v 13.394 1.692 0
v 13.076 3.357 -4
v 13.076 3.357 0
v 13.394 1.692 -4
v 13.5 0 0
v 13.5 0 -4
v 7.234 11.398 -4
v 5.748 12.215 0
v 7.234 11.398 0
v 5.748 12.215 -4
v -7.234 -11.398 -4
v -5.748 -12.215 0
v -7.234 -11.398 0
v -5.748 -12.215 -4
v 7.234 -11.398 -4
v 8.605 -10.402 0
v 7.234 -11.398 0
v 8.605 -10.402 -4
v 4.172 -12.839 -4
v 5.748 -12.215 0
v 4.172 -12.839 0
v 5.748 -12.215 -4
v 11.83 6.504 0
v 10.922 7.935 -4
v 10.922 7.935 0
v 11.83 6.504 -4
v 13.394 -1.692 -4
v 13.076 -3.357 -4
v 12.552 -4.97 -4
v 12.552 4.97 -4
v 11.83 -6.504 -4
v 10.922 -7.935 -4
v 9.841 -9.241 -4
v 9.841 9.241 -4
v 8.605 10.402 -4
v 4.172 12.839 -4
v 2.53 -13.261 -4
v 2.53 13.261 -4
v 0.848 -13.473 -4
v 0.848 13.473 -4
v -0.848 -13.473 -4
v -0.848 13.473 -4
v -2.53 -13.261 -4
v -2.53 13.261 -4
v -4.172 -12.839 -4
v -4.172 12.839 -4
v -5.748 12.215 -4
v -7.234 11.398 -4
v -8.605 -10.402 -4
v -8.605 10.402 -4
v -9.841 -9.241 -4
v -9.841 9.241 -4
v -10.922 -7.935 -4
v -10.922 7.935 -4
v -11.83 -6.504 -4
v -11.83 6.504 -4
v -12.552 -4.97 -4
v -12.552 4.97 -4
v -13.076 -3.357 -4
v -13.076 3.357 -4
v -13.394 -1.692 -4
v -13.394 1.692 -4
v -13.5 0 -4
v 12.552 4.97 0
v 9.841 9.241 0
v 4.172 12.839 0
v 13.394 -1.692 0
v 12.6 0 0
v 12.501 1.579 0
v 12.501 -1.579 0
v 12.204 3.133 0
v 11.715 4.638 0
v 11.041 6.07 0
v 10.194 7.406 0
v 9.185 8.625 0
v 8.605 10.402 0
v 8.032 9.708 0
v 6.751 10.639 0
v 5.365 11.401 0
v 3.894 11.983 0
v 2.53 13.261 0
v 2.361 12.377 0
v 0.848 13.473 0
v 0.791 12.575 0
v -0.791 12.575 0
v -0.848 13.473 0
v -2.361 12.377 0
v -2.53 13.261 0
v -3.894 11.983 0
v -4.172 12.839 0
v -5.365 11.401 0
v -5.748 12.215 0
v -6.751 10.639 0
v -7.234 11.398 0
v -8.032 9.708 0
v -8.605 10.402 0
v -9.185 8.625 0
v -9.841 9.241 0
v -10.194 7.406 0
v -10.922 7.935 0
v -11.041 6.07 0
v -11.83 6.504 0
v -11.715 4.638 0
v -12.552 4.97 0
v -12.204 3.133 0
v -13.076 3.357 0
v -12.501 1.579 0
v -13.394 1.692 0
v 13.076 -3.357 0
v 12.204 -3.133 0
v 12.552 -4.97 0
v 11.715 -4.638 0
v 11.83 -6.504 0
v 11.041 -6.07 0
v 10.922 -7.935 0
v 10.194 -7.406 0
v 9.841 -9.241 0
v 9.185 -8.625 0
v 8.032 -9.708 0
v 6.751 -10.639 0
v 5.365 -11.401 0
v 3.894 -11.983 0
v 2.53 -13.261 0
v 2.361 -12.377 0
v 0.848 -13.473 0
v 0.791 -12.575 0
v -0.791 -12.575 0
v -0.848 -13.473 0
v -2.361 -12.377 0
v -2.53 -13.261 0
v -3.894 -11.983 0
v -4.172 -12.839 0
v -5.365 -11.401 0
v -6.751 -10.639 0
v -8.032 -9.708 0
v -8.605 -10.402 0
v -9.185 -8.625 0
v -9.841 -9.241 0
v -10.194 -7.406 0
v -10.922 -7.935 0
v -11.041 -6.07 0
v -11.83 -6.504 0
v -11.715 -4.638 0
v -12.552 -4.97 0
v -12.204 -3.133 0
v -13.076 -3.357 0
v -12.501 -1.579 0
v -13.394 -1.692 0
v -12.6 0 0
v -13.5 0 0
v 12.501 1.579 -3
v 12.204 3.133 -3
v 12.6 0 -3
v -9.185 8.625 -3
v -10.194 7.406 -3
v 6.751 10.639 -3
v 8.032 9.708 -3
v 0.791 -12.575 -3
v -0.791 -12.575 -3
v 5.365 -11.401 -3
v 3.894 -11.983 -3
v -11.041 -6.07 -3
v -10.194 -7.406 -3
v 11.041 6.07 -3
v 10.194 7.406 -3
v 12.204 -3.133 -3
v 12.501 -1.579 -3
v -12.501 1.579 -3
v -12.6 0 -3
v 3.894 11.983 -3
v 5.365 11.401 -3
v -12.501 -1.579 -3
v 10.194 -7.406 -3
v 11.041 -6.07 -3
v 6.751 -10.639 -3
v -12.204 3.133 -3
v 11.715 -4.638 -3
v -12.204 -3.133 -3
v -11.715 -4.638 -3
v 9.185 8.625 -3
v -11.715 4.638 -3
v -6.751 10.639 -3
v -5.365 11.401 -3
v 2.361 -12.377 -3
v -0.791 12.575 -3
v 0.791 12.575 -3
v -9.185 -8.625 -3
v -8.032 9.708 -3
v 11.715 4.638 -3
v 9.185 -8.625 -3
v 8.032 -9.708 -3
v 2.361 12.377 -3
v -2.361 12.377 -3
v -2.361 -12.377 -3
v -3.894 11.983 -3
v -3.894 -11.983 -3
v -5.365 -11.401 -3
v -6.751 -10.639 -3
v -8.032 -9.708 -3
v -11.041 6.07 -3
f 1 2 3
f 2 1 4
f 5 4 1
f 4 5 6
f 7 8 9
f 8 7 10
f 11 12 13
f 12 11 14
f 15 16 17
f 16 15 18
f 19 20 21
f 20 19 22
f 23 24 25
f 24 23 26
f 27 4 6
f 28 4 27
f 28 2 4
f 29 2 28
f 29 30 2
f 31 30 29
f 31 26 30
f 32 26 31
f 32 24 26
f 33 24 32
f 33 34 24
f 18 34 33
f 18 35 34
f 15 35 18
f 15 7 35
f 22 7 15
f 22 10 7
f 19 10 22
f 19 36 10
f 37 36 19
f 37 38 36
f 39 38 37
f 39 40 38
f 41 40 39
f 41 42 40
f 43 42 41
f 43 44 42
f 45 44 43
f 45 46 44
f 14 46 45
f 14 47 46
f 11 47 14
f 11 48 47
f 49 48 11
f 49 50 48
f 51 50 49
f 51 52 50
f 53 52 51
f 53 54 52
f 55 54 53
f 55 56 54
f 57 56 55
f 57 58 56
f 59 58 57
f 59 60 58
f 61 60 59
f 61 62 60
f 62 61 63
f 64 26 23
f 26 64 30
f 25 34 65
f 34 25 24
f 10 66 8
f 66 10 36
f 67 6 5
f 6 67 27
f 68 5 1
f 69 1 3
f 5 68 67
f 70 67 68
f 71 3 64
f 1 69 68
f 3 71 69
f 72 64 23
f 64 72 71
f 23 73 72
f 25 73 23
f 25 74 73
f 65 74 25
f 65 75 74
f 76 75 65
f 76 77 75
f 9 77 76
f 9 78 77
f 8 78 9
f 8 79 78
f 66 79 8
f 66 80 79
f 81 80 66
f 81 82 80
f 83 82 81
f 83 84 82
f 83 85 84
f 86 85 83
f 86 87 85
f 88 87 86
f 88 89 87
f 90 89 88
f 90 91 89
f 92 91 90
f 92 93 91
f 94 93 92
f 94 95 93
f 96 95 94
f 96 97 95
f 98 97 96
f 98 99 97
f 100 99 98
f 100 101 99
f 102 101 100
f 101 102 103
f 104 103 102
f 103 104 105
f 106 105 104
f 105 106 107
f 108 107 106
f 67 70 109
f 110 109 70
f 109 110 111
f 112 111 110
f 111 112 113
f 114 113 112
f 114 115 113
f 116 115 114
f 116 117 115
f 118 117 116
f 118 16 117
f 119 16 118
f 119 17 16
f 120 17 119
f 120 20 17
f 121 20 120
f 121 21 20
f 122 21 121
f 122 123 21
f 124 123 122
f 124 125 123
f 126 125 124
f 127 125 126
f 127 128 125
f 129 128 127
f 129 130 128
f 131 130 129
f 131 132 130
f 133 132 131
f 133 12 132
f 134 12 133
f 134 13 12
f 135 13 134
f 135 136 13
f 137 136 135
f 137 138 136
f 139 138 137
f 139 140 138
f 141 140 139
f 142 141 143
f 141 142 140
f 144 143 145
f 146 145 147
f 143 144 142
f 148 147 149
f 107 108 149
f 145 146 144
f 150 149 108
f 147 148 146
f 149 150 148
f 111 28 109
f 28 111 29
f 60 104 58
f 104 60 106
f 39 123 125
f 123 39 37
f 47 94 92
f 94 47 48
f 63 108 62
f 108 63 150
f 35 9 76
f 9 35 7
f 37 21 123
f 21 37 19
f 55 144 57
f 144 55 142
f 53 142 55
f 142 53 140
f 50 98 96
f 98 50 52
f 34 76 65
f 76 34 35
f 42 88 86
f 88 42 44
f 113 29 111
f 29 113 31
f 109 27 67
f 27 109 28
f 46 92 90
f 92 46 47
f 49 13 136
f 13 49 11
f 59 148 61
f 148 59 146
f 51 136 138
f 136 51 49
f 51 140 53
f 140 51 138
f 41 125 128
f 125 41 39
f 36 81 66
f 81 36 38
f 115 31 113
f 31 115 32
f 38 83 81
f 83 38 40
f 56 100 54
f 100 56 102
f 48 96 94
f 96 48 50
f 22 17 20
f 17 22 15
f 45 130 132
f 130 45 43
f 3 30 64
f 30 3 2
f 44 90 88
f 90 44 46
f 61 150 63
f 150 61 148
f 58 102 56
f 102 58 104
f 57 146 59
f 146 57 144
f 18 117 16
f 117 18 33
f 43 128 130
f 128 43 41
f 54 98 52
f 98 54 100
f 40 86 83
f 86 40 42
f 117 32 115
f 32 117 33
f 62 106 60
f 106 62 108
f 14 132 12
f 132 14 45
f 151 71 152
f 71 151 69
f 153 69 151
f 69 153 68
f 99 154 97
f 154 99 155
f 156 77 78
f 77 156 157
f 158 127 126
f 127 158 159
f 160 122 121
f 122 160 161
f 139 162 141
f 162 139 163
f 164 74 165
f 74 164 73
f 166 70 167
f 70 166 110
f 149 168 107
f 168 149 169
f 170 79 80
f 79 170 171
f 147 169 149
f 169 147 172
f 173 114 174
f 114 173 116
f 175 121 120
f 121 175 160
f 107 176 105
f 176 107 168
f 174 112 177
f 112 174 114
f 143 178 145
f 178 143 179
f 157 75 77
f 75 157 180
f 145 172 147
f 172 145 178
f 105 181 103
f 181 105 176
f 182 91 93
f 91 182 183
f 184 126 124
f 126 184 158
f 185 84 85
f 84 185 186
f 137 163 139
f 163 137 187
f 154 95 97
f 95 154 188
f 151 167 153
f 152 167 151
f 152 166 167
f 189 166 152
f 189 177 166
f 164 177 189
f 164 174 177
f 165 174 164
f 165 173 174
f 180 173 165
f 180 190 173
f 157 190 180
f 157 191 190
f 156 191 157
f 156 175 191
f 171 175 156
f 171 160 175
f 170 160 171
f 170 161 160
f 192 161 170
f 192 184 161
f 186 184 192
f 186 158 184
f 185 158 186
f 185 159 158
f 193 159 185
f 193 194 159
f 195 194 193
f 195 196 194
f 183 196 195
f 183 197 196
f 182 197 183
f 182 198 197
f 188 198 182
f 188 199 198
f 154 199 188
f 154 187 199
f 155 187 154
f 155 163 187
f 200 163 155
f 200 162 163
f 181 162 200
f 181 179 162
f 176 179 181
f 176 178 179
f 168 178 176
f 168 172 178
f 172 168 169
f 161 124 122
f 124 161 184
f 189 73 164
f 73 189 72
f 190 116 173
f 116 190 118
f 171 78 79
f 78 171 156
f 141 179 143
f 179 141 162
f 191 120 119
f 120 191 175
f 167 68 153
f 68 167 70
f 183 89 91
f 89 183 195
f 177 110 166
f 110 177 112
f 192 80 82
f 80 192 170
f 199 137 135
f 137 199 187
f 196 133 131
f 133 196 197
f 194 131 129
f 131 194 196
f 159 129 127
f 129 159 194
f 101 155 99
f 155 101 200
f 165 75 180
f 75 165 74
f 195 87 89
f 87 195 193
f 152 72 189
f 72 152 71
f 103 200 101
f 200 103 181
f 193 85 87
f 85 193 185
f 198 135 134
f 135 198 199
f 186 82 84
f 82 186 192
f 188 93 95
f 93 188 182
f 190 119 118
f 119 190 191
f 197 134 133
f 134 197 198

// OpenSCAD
$fn = 50;


difference() {
	union() {
		translate(v = [0, 0, -4.0000000000]) {
			cylinder(h = 4, r = 13.5000000000);
		}
	}
	union() {
		#translate(v = [0, 0, -3.0000000000]) {
			cylinder(h = 3, r = 12.6000000000);
		}
	}
}
